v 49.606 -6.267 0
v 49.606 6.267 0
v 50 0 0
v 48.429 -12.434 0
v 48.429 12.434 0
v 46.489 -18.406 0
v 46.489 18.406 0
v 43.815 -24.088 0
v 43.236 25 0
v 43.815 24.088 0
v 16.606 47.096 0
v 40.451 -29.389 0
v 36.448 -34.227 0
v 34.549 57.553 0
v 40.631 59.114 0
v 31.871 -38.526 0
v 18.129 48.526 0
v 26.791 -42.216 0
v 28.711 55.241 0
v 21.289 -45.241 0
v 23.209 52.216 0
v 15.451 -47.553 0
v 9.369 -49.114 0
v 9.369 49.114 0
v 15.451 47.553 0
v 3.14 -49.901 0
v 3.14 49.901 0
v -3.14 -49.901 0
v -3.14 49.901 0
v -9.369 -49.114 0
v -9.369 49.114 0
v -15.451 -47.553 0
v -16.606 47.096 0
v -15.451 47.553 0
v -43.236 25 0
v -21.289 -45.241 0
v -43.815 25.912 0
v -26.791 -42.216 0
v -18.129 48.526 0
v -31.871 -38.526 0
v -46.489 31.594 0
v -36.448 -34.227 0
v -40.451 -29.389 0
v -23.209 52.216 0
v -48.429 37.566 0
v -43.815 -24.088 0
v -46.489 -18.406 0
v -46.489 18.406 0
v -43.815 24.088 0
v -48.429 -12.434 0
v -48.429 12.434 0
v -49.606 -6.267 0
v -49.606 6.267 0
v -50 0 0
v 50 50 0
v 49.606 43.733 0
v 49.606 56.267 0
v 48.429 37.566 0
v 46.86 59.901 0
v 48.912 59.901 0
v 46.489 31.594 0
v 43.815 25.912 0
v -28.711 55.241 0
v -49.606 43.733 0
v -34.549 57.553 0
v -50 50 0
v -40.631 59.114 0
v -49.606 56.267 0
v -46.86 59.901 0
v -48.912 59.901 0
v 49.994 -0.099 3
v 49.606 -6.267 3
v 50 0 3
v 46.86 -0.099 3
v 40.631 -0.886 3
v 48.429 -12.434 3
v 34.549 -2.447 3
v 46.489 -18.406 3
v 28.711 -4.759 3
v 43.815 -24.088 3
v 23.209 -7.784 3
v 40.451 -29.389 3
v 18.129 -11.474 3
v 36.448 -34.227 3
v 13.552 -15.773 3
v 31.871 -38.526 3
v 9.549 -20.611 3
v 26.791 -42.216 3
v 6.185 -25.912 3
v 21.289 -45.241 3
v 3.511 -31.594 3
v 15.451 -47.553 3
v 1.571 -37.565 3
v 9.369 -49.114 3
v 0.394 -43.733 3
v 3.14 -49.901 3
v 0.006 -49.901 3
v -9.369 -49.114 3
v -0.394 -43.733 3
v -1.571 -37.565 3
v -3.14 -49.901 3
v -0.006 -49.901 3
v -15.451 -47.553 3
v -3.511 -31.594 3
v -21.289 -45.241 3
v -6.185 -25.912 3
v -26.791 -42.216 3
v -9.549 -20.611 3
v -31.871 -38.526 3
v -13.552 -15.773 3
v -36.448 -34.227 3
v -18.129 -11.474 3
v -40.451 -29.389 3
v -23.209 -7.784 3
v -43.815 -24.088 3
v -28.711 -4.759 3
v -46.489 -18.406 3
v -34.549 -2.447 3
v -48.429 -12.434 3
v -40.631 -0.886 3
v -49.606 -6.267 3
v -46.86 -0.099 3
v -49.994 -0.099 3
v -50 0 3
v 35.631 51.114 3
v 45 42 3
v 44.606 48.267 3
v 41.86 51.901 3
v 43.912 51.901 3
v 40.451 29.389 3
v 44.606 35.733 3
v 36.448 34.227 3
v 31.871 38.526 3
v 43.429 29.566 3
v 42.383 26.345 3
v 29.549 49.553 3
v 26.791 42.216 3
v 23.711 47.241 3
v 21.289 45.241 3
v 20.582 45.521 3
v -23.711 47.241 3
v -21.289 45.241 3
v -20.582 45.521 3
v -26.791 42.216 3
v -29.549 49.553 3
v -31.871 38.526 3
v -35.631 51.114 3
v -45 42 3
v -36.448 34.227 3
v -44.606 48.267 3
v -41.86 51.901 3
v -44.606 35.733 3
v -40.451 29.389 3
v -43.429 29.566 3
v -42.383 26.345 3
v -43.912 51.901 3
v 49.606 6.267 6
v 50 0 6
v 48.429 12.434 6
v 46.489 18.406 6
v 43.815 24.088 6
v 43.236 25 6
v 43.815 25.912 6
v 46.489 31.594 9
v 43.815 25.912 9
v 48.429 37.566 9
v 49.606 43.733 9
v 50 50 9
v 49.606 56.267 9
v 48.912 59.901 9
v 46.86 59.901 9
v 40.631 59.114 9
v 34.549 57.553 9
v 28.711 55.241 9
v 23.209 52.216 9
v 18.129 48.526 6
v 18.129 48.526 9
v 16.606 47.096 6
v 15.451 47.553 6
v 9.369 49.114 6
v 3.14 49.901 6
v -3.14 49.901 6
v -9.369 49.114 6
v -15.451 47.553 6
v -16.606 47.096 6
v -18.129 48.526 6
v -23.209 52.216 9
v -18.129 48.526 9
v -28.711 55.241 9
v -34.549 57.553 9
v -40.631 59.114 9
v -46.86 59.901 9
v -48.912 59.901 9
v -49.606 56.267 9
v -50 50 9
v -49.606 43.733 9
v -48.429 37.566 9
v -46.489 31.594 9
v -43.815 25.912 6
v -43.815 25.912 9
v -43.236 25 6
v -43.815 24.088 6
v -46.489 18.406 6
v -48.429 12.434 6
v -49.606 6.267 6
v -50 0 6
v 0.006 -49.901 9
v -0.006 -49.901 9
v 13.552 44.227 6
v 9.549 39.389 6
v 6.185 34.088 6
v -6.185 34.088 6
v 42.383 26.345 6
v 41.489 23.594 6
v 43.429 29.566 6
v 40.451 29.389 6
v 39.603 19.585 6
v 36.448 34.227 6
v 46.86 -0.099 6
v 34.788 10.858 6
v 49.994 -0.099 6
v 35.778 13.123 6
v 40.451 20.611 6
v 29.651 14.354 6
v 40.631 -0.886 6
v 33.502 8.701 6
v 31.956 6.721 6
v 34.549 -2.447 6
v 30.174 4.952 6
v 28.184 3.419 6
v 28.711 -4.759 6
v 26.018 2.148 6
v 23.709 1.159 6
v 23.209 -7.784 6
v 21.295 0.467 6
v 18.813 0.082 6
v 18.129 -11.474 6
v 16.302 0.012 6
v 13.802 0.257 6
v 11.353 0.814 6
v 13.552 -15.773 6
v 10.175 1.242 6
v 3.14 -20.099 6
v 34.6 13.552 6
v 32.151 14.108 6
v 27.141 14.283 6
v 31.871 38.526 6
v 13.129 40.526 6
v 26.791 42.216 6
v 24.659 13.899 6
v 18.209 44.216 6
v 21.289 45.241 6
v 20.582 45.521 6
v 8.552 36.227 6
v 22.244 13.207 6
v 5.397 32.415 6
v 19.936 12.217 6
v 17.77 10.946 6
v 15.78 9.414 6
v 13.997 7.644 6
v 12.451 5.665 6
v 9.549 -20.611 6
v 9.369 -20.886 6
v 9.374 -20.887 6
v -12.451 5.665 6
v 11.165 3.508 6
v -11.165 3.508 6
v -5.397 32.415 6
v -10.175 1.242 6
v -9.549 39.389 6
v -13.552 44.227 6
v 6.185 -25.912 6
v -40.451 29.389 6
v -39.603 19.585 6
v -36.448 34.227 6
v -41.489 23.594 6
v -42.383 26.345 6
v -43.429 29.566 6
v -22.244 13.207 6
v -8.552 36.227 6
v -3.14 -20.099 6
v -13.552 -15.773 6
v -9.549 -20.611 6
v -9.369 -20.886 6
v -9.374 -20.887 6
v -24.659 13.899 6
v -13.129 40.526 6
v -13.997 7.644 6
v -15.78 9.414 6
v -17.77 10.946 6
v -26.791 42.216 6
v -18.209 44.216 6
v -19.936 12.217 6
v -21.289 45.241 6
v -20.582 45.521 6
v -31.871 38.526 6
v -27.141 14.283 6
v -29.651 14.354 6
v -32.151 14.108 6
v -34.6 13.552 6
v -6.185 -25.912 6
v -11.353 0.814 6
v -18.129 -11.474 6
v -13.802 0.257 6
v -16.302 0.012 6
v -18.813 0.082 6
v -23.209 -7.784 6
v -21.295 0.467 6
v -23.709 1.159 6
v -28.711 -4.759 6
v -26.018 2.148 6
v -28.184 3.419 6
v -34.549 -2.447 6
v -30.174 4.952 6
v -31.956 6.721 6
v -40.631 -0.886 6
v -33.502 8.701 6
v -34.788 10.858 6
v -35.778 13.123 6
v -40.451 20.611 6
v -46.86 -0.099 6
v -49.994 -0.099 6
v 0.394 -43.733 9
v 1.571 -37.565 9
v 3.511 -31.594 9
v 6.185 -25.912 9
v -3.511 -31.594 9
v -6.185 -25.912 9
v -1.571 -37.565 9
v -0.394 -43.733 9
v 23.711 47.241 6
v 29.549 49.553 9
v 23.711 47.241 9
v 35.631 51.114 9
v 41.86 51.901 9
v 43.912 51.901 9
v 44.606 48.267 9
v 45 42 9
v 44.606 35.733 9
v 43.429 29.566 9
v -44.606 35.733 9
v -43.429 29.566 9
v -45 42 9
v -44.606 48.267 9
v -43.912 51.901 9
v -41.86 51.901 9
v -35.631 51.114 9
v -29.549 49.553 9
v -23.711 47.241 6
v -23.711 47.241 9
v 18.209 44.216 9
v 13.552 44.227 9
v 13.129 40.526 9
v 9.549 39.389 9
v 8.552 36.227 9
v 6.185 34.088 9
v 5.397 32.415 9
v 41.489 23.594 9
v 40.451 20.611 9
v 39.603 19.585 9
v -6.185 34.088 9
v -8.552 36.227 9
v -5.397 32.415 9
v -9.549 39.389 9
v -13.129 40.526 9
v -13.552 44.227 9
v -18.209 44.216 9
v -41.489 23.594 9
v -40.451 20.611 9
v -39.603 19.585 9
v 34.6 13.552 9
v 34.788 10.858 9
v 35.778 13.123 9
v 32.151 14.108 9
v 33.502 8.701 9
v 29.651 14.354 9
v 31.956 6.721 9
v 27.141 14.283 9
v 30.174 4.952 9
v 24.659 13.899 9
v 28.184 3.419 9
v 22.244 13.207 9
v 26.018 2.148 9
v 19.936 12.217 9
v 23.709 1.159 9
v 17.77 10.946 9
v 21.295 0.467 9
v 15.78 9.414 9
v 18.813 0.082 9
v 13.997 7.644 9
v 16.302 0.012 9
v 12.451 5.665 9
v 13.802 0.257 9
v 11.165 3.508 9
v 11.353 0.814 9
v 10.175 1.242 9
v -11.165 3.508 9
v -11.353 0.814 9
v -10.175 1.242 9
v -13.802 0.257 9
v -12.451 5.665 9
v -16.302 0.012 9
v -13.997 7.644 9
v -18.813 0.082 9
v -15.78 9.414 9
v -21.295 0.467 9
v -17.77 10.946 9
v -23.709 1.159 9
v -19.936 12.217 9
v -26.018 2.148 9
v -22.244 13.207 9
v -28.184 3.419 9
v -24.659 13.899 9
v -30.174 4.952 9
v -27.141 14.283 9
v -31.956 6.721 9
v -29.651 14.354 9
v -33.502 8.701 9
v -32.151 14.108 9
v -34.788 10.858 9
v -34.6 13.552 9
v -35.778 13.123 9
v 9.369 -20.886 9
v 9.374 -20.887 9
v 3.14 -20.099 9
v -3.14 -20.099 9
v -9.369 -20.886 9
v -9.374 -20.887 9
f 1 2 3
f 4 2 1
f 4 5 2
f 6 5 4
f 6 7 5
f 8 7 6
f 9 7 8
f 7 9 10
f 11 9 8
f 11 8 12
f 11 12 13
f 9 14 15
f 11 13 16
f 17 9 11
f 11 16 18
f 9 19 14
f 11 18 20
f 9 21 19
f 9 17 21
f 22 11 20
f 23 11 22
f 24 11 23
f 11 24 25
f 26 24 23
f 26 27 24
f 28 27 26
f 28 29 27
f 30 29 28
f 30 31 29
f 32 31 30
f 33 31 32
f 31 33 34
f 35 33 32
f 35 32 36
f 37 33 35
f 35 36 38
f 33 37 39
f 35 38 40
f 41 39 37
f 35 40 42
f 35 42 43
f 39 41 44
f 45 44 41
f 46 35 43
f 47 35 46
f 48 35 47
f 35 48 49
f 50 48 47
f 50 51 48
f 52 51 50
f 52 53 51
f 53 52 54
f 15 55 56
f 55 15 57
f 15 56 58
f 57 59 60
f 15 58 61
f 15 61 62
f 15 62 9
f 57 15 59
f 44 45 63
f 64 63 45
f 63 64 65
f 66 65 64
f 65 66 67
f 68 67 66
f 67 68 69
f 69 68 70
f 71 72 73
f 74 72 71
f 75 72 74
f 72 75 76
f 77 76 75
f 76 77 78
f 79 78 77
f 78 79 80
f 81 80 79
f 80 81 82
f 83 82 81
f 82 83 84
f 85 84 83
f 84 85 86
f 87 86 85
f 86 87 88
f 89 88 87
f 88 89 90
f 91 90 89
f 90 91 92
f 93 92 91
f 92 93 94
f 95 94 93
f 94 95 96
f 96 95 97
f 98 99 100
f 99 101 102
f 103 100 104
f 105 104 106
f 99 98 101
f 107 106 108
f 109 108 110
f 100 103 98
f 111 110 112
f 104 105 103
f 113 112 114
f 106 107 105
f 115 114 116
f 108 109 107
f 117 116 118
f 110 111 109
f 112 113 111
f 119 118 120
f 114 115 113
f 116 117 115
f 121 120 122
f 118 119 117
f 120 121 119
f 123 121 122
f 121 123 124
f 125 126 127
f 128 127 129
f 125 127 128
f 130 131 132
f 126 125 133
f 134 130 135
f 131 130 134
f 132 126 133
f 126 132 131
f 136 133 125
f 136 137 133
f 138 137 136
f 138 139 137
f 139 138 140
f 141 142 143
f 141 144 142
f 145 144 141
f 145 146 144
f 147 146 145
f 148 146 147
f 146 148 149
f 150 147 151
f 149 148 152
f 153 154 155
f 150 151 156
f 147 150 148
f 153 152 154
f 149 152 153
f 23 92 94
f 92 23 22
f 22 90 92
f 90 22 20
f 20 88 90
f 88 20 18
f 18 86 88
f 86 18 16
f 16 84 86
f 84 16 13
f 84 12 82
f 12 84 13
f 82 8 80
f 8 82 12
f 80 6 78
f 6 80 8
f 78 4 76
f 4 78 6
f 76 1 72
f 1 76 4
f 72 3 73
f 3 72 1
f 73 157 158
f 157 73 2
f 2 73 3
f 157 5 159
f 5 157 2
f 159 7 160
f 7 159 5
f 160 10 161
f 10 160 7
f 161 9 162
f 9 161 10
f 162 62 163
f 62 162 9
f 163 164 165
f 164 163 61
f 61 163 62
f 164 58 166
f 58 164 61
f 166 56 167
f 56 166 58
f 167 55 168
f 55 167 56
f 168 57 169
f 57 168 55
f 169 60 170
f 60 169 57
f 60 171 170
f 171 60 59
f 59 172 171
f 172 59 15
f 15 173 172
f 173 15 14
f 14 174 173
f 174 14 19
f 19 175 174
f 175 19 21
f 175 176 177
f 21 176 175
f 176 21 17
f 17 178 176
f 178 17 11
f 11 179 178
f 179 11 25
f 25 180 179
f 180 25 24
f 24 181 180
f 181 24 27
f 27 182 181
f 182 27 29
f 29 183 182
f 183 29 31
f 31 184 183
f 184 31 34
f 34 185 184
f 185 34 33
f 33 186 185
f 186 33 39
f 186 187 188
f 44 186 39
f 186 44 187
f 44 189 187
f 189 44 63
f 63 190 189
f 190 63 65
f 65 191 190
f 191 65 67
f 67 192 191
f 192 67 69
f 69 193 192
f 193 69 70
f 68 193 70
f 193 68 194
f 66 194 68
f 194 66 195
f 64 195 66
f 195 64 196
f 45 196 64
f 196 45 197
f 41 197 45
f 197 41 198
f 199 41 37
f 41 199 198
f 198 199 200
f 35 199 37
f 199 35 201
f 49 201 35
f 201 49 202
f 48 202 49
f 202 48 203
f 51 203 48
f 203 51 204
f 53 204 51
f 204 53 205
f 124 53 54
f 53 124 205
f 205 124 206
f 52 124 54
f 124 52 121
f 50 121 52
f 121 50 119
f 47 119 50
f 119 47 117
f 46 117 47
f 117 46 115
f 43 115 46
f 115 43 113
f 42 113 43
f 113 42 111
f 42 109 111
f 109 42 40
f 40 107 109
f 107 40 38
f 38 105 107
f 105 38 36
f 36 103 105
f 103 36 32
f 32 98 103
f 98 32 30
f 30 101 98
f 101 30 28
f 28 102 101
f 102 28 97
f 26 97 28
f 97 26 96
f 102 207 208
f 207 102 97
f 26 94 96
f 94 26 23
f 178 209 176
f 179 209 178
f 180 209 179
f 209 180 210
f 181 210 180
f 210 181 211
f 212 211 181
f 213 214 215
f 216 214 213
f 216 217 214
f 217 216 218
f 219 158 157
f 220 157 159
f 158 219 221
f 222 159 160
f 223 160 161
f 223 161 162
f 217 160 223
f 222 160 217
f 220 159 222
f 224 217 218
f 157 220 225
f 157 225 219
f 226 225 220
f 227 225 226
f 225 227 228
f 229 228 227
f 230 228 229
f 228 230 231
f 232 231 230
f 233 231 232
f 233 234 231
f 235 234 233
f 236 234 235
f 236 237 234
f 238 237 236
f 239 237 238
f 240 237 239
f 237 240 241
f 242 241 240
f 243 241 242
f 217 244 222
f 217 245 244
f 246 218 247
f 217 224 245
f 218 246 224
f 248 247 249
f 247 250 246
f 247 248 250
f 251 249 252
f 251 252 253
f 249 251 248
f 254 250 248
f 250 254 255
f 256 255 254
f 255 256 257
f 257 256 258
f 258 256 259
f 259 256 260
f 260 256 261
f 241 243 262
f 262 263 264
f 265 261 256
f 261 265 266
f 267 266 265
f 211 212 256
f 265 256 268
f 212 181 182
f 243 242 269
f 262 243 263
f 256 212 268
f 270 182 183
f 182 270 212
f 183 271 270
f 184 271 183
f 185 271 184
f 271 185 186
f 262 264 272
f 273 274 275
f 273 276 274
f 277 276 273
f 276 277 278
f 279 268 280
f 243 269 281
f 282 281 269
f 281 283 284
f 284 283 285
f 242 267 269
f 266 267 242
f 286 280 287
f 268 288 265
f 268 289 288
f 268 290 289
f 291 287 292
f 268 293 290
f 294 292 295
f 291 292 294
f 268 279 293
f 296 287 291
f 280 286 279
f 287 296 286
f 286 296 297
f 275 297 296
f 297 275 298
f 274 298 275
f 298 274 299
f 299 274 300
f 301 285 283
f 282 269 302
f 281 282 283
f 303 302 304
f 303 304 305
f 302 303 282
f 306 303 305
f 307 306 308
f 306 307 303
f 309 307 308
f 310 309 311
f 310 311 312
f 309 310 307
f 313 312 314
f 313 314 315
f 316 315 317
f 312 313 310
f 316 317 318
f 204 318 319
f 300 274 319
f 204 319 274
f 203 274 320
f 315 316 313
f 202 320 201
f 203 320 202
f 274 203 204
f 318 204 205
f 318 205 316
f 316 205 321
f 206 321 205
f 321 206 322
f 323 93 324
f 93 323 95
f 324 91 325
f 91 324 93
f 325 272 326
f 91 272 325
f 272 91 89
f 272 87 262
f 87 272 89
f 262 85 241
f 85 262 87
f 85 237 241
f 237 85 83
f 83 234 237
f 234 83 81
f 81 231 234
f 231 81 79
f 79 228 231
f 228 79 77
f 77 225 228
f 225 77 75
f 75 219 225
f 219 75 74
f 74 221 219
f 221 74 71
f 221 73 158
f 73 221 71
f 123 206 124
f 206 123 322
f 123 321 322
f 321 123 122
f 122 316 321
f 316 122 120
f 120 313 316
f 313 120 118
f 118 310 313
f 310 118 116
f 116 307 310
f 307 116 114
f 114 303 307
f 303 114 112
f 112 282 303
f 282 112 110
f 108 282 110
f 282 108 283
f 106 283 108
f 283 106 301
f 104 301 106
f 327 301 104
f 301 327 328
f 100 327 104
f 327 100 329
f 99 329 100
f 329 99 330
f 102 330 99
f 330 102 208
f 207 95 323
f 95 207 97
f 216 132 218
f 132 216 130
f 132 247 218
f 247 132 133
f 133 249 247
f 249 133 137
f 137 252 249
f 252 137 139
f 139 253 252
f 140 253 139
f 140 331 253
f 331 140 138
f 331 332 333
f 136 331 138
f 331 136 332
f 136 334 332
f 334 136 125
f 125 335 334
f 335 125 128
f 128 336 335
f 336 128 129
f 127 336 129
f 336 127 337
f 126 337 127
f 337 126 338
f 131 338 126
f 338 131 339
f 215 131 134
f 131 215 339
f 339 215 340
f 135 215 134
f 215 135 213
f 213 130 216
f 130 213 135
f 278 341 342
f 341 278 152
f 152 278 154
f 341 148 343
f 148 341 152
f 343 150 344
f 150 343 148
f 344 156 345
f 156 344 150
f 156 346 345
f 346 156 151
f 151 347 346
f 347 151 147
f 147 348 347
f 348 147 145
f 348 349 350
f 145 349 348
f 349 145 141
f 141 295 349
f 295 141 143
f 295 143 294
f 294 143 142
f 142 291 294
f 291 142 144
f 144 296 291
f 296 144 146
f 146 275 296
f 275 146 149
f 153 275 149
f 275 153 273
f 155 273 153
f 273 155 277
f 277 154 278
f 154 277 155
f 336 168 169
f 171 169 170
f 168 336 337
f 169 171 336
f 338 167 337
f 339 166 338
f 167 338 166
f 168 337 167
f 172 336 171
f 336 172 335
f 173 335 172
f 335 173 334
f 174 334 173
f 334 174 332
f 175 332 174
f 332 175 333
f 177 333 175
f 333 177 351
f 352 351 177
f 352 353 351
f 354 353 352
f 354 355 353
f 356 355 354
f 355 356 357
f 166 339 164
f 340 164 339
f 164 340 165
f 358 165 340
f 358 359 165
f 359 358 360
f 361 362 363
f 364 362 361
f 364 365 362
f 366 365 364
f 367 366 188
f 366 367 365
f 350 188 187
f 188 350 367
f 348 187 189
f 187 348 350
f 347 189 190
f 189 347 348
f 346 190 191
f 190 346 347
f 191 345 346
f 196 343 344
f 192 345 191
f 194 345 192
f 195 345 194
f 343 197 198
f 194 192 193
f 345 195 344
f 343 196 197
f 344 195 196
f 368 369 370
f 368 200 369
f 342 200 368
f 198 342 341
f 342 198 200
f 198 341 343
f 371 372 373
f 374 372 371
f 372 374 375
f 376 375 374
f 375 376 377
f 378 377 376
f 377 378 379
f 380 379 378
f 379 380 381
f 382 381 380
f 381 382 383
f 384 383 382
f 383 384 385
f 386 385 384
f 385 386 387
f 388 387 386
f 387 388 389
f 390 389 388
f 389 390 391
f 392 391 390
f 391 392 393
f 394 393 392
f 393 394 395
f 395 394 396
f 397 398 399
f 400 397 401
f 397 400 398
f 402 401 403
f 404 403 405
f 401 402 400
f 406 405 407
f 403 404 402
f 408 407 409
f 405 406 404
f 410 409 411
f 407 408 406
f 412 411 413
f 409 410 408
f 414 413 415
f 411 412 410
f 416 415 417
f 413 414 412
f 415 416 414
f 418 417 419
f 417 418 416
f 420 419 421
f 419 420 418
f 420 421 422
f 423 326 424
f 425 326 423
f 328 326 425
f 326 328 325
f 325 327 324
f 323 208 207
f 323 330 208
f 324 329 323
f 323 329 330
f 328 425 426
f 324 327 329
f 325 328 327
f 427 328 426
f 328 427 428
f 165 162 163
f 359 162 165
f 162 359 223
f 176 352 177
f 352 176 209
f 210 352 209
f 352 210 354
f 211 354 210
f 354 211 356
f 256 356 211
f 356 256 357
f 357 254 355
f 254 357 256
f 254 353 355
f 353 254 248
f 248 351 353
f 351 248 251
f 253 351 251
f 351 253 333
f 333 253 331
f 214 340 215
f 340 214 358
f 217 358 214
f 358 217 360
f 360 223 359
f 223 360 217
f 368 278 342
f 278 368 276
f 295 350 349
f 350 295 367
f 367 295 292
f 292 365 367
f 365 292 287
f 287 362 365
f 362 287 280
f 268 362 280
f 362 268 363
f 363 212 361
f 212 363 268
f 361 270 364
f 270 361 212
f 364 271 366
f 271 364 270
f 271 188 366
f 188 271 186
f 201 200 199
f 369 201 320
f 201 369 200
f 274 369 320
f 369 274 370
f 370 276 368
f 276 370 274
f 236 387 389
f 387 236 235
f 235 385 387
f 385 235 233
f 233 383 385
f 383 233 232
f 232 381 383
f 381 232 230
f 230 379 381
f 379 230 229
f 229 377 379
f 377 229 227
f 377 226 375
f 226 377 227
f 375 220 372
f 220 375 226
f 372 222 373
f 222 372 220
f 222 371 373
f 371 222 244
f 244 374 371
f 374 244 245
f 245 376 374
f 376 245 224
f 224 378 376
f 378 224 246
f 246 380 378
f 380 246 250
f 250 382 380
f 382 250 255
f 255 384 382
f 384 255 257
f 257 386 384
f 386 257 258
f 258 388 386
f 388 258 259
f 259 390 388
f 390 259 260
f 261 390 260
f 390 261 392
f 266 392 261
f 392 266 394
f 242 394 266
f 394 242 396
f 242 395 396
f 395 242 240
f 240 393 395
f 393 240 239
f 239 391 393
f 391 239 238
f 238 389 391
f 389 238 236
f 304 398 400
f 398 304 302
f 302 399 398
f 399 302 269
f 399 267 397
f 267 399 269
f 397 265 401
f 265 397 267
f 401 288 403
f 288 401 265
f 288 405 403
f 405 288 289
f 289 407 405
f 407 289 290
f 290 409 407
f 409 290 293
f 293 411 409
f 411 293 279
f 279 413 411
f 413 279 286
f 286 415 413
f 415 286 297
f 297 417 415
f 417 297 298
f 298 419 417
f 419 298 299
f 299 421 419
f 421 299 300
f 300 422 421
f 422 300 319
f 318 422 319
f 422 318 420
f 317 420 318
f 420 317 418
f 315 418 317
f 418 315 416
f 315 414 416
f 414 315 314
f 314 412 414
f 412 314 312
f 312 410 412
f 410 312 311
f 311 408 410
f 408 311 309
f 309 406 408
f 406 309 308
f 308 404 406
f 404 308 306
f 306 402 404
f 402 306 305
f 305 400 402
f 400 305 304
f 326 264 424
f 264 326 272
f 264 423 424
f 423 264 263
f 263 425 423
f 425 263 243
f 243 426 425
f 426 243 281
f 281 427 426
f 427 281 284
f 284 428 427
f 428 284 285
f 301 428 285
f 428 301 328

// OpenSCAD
// Height of layer 1 (white)
layer1Height = 3;
// Height of layer 2 (orange)
layer2Height = 3;
// Height of layer 3 (black)
layer3Height = 3;

/* [Animation] */
// rotating animation
animation_rotation = false;
// resolution
$fn = 50;

/* [Hidden] */
is_animated = animation_rotation;
$vpt = is_animated ? [0, 0, 0] : [];
$vpr = is_animated ? [60, 0, animation_rotation ? (365 * $t) : 45] : []; // animation rotate around the object
$vpd = is_animated ? 500 : [];

fox();

module fox() {
  color("white")
    linear_extrude(layer1Height)
      layer1();

  color("orange")
    translate([0, 0, layer1Height])
      linear_extrude(layer2Height)
        layer2();

  color("DarkSlateGray")
    translate([0, 0, layer1Height + layer2Height])
      linear_extrude(layer3Height)
        layer3();
}

module layer1() {
  circle(r = 50);
  mmirror([1, 0, 0])
    hearIn();
}

module layer2() {
  face();
  mmirror([1, 0, 0])
    hearOut();
}

module layer3() {
  mmirror([1, 0, 0])
    eye();
  mmirror([1, 0, 0])
    hearOut();
  intersection() {
    face();
    translate([0, -70, 0])
      circle(r = 50);
  }
}

module face() {
  difference() {
    color("orange")
      circle(r = 50);
    color("orange")
      mmirror([1, 0, 0])
        translate([-50, -50, 0])
          circle(r = 50);
  }
}

module hearOut() {
  difference() {
    hearIn();
    translate([-5, -8, 0])
      hearIn();
  }
}

module hearIn() {
  translate([0, 50, 0])
    intersection() {
      circle(r = 50);
      translate([50, -40, 0])
        circle(r = 50);
    }
}

module eye() {
  translate([17, 20, 0])
    rotate([0, 0, -20])
      intersection() {
        circle(r = 20);
        translate([20, -20, 0])
          circle(r = 20);
      }
}

/*
same as mirror but duplicate children
*/
module mmirror(mat) {
  children();
  mirror(mat)
    children();
}
